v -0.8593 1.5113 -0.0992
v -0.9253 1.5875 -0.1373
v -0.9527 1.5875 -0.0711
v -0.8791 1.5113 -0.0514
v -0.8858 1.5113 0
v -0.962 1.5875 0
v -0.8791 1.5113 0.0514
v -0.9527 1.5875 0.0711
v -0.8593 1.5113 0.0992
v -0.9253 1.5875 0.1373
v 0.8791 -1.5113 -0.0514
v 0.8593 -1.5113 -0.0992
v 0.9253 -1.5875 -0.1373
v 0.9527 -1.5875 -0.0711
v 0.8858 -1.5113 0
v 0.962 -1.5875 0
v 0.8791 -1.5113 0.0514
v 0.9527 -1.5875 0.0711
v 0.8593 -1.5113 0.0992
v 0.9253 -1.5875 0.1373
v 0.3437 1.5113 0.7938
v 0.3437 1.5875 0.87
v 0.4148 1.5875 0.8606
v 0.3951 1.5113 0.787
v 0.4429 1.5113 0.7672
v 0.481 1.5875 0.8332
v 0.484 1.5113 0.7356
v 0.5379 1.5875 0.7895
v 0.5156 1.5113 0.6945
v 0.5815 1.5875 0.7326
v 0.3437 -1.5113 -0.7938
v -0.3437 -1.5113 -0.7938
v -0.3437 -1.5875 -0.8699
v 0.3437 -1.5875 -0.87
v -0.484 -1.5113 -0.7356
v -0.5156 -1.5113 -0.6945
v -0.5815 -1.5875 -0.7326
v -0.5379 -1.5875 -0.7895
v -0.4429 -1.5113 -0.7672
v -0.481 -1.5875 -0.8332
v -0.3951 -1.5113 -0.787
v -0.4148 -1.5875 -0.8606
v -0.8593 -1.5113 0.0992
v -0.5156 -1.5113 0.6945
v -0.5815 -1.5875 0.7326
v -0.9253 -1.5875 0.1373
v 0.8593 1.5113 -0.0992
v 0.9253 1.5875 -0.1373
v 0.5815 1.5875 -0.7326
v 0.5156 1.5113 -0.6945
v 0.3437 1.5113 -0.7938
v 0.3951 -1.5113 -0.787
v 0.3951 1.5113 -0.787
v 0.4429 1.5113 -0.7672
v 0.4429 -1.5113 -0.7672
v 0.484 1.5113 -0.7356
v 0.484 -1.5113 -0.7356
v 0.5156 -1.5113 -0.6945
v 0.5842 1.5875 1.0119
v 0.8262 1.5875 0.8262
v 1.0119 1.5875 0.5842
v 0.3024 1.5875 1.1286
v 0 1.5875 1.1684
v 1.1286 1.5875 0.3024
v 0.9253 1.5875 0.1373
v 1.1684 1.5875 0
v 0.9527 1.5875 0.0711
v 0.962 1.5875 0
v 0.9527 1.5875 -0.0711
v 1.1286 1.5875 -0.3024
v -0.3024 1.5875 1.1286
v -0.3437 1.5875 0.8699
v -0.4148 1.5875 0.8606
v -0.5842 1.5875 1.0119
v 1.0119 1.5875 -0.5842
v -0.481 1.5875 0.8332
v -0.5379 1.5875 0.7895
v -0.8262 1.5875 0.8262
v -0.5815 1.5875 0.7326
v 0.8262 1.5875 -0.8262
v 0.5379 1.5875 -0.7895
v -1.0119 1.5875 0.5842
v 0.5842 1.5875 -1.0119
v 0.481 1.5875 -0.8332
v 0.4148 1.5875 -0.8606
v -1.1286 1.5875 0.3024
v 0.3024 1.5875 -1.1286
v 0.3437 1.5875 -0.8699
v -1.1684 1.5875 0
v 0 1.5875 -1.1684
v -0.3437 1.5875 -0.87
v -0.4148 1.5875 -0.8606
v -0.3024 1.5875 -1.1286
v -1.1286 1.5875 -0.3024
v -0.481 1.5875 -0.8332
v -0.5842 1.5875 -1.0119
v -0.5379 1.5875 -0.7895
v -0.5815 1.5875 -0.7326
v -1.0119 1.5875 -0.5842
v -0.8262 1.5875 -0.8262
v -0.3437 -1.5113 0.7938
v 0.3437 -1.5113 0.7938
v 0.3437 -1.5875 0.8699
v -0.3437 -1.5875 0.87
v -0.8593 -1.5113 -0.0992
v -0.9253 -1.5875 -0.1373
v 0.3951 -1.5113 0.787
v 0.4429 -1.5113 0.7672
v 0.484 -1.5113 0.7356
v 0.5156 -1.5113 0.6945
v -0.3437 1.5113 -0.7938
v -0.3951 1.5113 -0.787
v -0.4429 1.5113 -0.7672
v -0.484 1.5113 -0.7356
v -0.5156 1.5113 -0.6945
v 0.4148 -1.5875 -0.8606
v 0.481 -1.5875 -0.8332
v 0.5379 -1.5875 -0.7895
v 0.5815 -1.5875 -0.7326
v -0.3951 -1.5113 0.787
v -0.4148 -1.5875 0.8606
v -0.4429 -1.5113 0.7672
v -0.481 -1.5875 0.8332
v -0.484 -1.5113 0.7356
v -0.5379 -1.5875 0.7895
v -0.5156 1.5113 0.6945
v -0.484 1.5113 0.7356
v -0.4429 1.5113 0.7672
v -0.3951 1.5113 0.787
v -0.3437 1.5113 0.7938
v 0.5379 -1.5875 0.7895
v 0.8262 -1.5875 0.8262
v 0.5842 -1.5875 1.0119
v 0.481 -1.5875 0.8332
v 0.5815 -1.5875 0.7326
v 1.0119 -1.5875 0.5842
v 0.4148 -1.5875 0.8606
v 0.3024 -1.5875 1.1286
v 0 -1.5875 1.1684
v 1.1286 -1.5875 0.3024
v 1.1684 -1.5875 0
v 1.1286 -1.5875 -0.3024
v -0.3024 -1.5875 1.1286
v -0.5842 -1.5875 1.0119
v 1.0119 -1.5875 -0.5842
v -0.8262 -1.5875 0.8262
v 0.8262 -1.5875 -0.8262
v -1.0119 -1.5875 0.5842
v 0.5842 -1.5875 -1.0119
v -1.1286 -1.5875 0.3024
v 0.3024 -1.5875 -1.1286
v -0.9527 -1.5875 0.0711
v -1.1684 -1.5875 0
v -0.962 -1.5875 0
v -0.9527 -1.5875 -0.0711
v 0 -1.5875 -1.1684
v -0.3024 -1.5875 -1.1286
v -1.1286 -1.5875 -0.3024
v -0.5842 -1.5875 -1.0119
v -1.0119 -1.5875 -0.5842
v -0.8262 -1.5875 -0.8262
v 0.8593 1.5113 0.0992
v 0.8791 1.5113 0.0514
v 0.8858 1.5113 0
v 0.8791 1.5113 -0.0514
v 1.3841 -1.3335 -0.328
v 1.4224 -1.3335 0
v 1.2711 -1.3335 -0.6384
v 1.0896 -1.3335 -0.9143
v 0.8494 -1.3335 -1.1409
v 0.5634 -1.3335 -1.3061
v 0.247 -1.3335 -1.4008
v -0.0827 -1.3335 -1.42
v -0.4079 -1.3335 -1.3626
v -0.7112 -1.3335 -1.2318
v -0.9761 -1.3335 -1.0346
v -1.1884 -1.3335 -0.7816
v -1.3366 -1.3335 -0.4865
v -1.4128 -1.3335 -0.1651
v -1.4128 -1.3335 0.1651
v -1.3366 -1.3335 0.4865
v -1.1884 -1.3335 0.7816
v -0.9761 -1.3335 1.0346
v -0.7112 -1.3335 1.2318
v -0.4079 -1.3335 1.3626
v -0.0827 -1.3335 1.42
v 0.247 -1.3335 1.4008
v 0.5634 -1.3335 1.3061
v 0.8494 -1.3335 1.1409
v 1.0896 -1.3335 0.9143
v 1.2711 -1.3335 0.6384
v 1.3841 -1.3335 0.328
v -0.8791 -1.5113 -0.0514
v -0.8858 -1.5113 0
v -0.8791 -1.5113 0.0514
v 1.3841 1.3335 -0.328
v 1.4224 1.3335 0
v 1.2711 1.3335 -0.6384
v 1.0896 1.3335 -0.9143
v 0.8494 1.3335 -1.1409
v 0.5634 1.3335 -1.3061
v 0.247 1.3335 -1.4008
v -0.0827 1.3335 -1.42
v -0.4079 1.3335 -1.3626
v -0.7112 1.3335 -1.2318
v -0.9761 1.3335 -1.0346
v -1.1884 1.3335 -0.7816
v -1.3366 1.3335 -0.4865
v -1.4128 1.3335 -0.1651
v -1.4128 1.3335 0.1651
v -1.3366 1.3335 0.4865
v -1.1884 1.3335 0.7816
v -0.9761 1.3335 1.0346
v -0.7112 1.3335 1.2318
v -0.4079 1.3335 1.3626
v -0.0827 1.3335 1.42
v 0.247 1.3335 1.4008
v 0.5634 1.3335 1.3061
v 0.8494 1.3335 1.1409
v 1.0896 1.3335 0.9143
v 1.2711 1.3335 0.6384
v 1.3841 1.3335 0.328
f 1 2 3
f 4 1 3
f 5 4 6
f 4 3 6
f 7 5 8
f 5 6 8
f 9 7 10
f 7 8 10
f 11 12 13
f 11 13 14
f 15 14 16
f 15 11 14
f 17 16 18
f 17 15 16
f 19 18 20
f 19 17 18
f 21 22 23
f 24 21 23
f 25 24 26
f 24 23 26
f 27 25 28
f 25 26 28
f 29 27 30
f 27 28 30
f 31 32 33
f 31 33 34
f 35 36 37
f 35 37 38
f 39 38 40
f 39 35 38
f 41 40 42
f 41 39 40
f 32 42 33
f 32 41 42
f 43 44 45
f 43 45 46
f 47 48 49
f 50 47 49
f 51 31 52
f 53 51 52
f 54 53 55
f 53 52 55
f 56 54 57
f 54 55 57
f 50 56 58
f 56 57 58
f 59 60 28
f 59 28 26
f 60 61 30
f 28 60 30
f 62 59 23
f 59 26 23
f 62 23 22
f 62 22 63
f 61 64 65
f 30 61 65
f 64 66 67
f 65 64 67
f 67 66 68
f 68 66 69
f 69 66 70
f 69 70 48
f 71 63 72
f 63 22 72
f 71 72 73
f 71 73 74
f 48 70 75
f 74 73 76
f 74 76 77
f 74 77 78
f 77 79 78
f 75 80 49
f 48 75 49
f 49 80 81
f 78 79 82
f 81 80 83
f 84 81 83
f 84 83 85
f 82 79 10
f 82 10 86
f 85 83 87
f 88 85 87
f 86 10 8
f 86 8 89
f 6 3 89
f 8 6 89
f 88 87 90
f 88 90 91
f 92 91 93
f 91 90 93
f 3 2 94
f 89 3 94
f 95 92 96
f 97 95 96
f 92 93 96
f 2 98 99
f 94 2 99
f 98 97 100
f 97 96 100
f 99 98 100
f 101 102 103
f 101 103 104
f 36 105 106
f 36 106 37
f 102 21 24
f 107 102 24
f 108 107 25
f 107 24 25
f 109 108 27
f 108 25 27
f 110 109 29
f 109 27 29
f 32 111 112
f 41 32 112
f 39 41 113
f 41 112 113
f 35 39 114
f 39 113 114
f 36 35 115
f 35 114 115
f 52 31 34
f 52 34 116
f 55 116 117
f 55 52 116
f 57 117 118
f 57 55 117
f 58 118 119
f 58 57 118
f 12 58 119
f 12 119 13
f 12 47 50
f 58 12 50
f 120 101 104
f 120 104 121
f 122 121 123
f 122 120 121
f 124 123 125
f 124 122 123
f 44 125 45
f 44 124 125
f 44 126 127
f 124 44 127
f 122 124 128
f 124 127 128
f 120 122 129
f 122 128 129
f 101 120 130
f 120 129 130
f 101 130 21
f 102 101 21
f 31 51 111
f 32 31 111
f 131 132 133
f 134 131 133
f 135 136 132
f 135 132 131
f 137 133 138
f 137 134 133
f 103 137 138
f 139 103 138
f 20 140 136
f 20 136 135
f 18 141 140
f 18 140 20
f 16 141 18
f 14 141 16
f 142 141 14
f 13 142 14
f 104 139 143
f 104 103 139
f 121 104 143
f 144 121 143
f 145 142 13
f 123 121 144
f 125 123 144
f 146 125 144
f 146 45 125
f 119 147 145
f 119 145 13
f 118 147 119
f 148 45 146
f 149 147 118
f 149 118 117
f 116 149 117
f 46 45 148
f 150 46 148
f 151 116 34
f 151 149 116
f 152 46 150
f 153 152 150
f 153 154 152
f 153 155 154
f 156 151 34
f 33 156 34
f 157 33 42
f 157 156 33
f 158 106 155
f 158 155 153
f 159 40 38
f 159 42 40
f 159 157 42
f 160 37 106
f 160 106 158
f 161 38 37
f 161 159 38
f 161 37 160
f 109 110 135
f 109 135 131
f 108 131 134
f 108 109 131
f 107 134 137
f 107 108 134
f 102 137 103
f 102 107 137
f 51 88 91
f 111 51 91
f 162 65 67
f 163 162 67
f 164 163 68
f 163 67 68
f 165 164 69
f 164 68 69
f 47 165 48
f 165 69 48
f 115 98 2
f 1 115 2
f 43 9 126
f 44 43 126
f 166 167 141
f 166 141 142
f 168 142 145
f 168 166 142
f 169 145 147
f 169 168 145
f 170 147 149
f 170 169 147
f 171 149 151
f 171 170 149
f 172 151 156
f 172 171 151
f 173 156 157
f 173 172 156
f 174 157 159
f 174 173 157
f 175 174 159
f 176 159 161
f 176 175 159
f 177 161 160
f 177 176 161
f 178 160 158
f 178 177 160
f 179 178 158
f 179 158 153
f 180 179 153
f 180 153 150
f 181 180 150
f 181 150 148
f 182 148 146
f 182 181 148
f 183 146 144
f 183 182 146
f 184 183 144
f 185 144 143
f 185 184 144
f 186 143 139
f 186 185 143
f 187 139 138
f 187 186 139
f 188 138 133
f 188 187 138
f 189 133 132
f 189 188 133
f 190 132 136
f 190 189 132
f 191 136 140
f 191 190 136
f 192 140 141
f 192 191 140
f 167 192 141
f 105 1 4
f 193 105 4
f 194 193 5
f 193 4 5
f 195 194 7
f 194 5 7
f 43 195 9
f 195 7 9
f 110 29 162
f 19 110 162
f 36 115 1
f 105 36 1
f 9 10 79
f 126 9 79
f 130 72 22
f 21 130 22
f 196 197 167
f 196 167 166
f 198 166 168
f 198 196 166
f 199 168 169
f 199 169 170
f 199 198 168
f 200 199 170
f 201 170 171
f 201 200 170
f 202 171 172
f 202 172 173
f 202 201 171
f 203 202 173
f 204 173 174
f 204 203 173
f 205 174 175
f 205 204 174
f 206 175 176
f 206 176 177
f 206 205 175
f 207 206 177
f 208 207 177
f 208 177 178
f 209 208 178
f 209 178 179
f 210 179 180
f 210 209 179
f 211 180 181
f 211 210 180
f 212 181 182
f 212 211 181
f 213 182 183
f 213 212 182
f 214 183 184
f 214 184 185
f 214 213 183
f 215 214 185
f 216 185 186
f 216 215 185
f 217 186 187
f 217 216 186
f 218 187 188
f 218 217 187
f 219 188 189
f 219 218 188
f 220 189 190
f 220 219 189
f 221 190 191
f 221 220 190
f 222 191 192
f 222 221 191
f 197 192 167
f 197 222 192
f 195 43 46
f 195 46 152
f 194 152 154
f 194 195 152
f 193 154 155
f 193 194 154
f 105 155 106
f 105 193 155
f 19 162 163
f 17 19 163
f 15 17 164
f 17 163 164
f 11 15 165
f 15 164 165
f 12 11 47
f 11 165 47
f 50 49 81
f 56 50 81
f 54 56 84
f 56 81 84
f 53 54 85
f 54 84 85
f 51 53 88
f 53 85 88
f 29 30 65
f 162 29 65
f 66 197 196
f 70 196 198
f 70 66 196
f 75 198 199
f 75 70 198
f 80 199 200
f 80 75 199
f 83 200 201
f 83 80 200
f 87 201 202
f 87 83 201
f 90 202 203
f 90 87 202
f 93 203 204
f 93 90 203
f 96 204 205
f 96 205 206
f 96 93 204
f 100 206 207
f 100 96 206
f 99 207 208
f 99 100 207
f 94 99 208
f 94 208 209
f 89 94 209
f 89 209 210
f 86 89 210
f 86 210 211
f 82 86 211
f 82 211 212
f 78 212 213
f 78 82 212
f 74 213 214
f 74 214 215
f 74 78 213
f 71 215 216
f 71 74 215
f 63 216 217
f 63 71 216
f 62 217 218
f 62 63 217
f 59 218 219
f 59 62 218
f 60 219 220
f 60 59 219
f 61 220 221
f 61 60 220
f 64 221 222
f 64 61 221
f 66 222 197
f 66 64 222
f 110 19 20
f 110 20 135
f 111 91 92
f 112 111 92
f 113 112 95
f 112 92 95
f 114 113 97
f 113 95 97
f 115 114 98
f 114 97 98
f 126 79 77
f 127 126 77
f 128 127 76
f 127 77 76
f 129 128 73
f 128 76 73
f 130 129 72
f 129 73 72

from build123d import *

# Parameters (mm, degrees)
SKETCH1_W               = 1.4224
SKETCH1_H               = 3.175
CUT_EXTRUDE1_DEPTH      = 2.5875
CUT_EXTRUDE1_DEPTH_BACK = 2.5875
FILLET1_R               = 0.1984375
CHAMFER1_SIZE           = 0.254
CHAMFER2_SIZE           = 0.0762


with BuildPart() as part:
    # Sketch1 → Revolve1 (revolve)
    with BuildSketch(Plane.XY):
        with Locations((0.7112, 0)):
            Rectangle(SKETCH1_W, SKETCH1_H)
    revolve(axis=Axis((0, -1.704166029, 0), (0, 1, 0)))

    # Sketch3 → Cut-Extrude1 (cut, two sides)
    with BuildSketch(Plane(origin=(0, 0, 0), x_dir=(1, 0, 0), z_dir=(0, 1, 0))) as cut_extrude1_sk:
        Polygon((0.916543552, 0), (0.458271776, 0.79375), (-0.458271776, 0.79375), (-0.916543552, 0), (-0.458271776, -0.79375), (0.458271776, -0.79375), align=None)
    extrude(amount=CUT_EXTRUDE1_DEPTH, mode=Mode.SUBTRACT)
    extrude(cut_extrude1_sk.sketch, amount=-CUT_EXTRUDE1_DEPTH_BACK, mode=Mode.SUBTRACT)

    # Fillet1
    fillet1_edges = [part.edges().sort_by_distance(p)[0] for p in [
        (0.458271776, 0, -0.79375),
        (0.916543552, 0, 0),
        (0.458271776, 0, 0.79375),
        (-0.458271776, 0, 0.79375),
        (-0.916543552, 0, 0),
        (-0.458271776, 0, -0.79375),
    ]]
    fillet(fillet1_edges, radius=FILLET1_R)

    # Chamfer1
    chamfer1_edges = [part.edges().sort_by_distance(p)[0] for p in [
        (-1.4224, 1.5875, 0),
        (-1.4224, -1.5875, 0),
    ]]
    chamfer(chamfer1_edges, length=CHAMFER1_SIZE)

    # Chamfer2
    chamfer2_edges = [part.edges().sort_by_distance(p)[0] for p in [
        (0.687407664, -1.5875, -0.396875),
        (0.687407664, 1.5875, -0.396875),
        (0.687407664, -1.5875, 0.396875),
        (0.687407664, 1.5875, 0.396875),
        (0, -1.5875, 0.79375),
        (0, 1.5875, 0.79375),
        (-0.687407664, -1.5875, 0.396875),
        (-0.687407664, 1.5875, 0.396875),
        (-0.687407664, -1.5875, -0.396875),
        (-0.687407664, 1.5875, -0.396875),
        (0, -1.5875, -0.79375),
        (0, 1.5875, -0.79375),
        (0.885845164, 1.5875, 0),
        (0.885845164, -1.5875, 0),
        (0.442922582, 1.5875, 0.767164416),
        (0.442922582, -1.5875, 0.767164416),
        (-0.442922582, 1.5875, 0.767164416),
        (-0.442922582, -1.5875, 0.767164416),
        (-0.885845164, 1.5875, 0),
        (-0.885845164, -1.5875, 0),
        (-0.442922582, 1.5875, -0.767164416),
        (-0.442922582, -1.5875, -0.767164416),
        (0.442922582, 1.5875, -0.767164416),
        (0.442922582, -1.5875, -0.767164416),
    ]]
    chamfer(chamfer2_edges, length=CHAMFER2_SIZE)


solid = part.part
